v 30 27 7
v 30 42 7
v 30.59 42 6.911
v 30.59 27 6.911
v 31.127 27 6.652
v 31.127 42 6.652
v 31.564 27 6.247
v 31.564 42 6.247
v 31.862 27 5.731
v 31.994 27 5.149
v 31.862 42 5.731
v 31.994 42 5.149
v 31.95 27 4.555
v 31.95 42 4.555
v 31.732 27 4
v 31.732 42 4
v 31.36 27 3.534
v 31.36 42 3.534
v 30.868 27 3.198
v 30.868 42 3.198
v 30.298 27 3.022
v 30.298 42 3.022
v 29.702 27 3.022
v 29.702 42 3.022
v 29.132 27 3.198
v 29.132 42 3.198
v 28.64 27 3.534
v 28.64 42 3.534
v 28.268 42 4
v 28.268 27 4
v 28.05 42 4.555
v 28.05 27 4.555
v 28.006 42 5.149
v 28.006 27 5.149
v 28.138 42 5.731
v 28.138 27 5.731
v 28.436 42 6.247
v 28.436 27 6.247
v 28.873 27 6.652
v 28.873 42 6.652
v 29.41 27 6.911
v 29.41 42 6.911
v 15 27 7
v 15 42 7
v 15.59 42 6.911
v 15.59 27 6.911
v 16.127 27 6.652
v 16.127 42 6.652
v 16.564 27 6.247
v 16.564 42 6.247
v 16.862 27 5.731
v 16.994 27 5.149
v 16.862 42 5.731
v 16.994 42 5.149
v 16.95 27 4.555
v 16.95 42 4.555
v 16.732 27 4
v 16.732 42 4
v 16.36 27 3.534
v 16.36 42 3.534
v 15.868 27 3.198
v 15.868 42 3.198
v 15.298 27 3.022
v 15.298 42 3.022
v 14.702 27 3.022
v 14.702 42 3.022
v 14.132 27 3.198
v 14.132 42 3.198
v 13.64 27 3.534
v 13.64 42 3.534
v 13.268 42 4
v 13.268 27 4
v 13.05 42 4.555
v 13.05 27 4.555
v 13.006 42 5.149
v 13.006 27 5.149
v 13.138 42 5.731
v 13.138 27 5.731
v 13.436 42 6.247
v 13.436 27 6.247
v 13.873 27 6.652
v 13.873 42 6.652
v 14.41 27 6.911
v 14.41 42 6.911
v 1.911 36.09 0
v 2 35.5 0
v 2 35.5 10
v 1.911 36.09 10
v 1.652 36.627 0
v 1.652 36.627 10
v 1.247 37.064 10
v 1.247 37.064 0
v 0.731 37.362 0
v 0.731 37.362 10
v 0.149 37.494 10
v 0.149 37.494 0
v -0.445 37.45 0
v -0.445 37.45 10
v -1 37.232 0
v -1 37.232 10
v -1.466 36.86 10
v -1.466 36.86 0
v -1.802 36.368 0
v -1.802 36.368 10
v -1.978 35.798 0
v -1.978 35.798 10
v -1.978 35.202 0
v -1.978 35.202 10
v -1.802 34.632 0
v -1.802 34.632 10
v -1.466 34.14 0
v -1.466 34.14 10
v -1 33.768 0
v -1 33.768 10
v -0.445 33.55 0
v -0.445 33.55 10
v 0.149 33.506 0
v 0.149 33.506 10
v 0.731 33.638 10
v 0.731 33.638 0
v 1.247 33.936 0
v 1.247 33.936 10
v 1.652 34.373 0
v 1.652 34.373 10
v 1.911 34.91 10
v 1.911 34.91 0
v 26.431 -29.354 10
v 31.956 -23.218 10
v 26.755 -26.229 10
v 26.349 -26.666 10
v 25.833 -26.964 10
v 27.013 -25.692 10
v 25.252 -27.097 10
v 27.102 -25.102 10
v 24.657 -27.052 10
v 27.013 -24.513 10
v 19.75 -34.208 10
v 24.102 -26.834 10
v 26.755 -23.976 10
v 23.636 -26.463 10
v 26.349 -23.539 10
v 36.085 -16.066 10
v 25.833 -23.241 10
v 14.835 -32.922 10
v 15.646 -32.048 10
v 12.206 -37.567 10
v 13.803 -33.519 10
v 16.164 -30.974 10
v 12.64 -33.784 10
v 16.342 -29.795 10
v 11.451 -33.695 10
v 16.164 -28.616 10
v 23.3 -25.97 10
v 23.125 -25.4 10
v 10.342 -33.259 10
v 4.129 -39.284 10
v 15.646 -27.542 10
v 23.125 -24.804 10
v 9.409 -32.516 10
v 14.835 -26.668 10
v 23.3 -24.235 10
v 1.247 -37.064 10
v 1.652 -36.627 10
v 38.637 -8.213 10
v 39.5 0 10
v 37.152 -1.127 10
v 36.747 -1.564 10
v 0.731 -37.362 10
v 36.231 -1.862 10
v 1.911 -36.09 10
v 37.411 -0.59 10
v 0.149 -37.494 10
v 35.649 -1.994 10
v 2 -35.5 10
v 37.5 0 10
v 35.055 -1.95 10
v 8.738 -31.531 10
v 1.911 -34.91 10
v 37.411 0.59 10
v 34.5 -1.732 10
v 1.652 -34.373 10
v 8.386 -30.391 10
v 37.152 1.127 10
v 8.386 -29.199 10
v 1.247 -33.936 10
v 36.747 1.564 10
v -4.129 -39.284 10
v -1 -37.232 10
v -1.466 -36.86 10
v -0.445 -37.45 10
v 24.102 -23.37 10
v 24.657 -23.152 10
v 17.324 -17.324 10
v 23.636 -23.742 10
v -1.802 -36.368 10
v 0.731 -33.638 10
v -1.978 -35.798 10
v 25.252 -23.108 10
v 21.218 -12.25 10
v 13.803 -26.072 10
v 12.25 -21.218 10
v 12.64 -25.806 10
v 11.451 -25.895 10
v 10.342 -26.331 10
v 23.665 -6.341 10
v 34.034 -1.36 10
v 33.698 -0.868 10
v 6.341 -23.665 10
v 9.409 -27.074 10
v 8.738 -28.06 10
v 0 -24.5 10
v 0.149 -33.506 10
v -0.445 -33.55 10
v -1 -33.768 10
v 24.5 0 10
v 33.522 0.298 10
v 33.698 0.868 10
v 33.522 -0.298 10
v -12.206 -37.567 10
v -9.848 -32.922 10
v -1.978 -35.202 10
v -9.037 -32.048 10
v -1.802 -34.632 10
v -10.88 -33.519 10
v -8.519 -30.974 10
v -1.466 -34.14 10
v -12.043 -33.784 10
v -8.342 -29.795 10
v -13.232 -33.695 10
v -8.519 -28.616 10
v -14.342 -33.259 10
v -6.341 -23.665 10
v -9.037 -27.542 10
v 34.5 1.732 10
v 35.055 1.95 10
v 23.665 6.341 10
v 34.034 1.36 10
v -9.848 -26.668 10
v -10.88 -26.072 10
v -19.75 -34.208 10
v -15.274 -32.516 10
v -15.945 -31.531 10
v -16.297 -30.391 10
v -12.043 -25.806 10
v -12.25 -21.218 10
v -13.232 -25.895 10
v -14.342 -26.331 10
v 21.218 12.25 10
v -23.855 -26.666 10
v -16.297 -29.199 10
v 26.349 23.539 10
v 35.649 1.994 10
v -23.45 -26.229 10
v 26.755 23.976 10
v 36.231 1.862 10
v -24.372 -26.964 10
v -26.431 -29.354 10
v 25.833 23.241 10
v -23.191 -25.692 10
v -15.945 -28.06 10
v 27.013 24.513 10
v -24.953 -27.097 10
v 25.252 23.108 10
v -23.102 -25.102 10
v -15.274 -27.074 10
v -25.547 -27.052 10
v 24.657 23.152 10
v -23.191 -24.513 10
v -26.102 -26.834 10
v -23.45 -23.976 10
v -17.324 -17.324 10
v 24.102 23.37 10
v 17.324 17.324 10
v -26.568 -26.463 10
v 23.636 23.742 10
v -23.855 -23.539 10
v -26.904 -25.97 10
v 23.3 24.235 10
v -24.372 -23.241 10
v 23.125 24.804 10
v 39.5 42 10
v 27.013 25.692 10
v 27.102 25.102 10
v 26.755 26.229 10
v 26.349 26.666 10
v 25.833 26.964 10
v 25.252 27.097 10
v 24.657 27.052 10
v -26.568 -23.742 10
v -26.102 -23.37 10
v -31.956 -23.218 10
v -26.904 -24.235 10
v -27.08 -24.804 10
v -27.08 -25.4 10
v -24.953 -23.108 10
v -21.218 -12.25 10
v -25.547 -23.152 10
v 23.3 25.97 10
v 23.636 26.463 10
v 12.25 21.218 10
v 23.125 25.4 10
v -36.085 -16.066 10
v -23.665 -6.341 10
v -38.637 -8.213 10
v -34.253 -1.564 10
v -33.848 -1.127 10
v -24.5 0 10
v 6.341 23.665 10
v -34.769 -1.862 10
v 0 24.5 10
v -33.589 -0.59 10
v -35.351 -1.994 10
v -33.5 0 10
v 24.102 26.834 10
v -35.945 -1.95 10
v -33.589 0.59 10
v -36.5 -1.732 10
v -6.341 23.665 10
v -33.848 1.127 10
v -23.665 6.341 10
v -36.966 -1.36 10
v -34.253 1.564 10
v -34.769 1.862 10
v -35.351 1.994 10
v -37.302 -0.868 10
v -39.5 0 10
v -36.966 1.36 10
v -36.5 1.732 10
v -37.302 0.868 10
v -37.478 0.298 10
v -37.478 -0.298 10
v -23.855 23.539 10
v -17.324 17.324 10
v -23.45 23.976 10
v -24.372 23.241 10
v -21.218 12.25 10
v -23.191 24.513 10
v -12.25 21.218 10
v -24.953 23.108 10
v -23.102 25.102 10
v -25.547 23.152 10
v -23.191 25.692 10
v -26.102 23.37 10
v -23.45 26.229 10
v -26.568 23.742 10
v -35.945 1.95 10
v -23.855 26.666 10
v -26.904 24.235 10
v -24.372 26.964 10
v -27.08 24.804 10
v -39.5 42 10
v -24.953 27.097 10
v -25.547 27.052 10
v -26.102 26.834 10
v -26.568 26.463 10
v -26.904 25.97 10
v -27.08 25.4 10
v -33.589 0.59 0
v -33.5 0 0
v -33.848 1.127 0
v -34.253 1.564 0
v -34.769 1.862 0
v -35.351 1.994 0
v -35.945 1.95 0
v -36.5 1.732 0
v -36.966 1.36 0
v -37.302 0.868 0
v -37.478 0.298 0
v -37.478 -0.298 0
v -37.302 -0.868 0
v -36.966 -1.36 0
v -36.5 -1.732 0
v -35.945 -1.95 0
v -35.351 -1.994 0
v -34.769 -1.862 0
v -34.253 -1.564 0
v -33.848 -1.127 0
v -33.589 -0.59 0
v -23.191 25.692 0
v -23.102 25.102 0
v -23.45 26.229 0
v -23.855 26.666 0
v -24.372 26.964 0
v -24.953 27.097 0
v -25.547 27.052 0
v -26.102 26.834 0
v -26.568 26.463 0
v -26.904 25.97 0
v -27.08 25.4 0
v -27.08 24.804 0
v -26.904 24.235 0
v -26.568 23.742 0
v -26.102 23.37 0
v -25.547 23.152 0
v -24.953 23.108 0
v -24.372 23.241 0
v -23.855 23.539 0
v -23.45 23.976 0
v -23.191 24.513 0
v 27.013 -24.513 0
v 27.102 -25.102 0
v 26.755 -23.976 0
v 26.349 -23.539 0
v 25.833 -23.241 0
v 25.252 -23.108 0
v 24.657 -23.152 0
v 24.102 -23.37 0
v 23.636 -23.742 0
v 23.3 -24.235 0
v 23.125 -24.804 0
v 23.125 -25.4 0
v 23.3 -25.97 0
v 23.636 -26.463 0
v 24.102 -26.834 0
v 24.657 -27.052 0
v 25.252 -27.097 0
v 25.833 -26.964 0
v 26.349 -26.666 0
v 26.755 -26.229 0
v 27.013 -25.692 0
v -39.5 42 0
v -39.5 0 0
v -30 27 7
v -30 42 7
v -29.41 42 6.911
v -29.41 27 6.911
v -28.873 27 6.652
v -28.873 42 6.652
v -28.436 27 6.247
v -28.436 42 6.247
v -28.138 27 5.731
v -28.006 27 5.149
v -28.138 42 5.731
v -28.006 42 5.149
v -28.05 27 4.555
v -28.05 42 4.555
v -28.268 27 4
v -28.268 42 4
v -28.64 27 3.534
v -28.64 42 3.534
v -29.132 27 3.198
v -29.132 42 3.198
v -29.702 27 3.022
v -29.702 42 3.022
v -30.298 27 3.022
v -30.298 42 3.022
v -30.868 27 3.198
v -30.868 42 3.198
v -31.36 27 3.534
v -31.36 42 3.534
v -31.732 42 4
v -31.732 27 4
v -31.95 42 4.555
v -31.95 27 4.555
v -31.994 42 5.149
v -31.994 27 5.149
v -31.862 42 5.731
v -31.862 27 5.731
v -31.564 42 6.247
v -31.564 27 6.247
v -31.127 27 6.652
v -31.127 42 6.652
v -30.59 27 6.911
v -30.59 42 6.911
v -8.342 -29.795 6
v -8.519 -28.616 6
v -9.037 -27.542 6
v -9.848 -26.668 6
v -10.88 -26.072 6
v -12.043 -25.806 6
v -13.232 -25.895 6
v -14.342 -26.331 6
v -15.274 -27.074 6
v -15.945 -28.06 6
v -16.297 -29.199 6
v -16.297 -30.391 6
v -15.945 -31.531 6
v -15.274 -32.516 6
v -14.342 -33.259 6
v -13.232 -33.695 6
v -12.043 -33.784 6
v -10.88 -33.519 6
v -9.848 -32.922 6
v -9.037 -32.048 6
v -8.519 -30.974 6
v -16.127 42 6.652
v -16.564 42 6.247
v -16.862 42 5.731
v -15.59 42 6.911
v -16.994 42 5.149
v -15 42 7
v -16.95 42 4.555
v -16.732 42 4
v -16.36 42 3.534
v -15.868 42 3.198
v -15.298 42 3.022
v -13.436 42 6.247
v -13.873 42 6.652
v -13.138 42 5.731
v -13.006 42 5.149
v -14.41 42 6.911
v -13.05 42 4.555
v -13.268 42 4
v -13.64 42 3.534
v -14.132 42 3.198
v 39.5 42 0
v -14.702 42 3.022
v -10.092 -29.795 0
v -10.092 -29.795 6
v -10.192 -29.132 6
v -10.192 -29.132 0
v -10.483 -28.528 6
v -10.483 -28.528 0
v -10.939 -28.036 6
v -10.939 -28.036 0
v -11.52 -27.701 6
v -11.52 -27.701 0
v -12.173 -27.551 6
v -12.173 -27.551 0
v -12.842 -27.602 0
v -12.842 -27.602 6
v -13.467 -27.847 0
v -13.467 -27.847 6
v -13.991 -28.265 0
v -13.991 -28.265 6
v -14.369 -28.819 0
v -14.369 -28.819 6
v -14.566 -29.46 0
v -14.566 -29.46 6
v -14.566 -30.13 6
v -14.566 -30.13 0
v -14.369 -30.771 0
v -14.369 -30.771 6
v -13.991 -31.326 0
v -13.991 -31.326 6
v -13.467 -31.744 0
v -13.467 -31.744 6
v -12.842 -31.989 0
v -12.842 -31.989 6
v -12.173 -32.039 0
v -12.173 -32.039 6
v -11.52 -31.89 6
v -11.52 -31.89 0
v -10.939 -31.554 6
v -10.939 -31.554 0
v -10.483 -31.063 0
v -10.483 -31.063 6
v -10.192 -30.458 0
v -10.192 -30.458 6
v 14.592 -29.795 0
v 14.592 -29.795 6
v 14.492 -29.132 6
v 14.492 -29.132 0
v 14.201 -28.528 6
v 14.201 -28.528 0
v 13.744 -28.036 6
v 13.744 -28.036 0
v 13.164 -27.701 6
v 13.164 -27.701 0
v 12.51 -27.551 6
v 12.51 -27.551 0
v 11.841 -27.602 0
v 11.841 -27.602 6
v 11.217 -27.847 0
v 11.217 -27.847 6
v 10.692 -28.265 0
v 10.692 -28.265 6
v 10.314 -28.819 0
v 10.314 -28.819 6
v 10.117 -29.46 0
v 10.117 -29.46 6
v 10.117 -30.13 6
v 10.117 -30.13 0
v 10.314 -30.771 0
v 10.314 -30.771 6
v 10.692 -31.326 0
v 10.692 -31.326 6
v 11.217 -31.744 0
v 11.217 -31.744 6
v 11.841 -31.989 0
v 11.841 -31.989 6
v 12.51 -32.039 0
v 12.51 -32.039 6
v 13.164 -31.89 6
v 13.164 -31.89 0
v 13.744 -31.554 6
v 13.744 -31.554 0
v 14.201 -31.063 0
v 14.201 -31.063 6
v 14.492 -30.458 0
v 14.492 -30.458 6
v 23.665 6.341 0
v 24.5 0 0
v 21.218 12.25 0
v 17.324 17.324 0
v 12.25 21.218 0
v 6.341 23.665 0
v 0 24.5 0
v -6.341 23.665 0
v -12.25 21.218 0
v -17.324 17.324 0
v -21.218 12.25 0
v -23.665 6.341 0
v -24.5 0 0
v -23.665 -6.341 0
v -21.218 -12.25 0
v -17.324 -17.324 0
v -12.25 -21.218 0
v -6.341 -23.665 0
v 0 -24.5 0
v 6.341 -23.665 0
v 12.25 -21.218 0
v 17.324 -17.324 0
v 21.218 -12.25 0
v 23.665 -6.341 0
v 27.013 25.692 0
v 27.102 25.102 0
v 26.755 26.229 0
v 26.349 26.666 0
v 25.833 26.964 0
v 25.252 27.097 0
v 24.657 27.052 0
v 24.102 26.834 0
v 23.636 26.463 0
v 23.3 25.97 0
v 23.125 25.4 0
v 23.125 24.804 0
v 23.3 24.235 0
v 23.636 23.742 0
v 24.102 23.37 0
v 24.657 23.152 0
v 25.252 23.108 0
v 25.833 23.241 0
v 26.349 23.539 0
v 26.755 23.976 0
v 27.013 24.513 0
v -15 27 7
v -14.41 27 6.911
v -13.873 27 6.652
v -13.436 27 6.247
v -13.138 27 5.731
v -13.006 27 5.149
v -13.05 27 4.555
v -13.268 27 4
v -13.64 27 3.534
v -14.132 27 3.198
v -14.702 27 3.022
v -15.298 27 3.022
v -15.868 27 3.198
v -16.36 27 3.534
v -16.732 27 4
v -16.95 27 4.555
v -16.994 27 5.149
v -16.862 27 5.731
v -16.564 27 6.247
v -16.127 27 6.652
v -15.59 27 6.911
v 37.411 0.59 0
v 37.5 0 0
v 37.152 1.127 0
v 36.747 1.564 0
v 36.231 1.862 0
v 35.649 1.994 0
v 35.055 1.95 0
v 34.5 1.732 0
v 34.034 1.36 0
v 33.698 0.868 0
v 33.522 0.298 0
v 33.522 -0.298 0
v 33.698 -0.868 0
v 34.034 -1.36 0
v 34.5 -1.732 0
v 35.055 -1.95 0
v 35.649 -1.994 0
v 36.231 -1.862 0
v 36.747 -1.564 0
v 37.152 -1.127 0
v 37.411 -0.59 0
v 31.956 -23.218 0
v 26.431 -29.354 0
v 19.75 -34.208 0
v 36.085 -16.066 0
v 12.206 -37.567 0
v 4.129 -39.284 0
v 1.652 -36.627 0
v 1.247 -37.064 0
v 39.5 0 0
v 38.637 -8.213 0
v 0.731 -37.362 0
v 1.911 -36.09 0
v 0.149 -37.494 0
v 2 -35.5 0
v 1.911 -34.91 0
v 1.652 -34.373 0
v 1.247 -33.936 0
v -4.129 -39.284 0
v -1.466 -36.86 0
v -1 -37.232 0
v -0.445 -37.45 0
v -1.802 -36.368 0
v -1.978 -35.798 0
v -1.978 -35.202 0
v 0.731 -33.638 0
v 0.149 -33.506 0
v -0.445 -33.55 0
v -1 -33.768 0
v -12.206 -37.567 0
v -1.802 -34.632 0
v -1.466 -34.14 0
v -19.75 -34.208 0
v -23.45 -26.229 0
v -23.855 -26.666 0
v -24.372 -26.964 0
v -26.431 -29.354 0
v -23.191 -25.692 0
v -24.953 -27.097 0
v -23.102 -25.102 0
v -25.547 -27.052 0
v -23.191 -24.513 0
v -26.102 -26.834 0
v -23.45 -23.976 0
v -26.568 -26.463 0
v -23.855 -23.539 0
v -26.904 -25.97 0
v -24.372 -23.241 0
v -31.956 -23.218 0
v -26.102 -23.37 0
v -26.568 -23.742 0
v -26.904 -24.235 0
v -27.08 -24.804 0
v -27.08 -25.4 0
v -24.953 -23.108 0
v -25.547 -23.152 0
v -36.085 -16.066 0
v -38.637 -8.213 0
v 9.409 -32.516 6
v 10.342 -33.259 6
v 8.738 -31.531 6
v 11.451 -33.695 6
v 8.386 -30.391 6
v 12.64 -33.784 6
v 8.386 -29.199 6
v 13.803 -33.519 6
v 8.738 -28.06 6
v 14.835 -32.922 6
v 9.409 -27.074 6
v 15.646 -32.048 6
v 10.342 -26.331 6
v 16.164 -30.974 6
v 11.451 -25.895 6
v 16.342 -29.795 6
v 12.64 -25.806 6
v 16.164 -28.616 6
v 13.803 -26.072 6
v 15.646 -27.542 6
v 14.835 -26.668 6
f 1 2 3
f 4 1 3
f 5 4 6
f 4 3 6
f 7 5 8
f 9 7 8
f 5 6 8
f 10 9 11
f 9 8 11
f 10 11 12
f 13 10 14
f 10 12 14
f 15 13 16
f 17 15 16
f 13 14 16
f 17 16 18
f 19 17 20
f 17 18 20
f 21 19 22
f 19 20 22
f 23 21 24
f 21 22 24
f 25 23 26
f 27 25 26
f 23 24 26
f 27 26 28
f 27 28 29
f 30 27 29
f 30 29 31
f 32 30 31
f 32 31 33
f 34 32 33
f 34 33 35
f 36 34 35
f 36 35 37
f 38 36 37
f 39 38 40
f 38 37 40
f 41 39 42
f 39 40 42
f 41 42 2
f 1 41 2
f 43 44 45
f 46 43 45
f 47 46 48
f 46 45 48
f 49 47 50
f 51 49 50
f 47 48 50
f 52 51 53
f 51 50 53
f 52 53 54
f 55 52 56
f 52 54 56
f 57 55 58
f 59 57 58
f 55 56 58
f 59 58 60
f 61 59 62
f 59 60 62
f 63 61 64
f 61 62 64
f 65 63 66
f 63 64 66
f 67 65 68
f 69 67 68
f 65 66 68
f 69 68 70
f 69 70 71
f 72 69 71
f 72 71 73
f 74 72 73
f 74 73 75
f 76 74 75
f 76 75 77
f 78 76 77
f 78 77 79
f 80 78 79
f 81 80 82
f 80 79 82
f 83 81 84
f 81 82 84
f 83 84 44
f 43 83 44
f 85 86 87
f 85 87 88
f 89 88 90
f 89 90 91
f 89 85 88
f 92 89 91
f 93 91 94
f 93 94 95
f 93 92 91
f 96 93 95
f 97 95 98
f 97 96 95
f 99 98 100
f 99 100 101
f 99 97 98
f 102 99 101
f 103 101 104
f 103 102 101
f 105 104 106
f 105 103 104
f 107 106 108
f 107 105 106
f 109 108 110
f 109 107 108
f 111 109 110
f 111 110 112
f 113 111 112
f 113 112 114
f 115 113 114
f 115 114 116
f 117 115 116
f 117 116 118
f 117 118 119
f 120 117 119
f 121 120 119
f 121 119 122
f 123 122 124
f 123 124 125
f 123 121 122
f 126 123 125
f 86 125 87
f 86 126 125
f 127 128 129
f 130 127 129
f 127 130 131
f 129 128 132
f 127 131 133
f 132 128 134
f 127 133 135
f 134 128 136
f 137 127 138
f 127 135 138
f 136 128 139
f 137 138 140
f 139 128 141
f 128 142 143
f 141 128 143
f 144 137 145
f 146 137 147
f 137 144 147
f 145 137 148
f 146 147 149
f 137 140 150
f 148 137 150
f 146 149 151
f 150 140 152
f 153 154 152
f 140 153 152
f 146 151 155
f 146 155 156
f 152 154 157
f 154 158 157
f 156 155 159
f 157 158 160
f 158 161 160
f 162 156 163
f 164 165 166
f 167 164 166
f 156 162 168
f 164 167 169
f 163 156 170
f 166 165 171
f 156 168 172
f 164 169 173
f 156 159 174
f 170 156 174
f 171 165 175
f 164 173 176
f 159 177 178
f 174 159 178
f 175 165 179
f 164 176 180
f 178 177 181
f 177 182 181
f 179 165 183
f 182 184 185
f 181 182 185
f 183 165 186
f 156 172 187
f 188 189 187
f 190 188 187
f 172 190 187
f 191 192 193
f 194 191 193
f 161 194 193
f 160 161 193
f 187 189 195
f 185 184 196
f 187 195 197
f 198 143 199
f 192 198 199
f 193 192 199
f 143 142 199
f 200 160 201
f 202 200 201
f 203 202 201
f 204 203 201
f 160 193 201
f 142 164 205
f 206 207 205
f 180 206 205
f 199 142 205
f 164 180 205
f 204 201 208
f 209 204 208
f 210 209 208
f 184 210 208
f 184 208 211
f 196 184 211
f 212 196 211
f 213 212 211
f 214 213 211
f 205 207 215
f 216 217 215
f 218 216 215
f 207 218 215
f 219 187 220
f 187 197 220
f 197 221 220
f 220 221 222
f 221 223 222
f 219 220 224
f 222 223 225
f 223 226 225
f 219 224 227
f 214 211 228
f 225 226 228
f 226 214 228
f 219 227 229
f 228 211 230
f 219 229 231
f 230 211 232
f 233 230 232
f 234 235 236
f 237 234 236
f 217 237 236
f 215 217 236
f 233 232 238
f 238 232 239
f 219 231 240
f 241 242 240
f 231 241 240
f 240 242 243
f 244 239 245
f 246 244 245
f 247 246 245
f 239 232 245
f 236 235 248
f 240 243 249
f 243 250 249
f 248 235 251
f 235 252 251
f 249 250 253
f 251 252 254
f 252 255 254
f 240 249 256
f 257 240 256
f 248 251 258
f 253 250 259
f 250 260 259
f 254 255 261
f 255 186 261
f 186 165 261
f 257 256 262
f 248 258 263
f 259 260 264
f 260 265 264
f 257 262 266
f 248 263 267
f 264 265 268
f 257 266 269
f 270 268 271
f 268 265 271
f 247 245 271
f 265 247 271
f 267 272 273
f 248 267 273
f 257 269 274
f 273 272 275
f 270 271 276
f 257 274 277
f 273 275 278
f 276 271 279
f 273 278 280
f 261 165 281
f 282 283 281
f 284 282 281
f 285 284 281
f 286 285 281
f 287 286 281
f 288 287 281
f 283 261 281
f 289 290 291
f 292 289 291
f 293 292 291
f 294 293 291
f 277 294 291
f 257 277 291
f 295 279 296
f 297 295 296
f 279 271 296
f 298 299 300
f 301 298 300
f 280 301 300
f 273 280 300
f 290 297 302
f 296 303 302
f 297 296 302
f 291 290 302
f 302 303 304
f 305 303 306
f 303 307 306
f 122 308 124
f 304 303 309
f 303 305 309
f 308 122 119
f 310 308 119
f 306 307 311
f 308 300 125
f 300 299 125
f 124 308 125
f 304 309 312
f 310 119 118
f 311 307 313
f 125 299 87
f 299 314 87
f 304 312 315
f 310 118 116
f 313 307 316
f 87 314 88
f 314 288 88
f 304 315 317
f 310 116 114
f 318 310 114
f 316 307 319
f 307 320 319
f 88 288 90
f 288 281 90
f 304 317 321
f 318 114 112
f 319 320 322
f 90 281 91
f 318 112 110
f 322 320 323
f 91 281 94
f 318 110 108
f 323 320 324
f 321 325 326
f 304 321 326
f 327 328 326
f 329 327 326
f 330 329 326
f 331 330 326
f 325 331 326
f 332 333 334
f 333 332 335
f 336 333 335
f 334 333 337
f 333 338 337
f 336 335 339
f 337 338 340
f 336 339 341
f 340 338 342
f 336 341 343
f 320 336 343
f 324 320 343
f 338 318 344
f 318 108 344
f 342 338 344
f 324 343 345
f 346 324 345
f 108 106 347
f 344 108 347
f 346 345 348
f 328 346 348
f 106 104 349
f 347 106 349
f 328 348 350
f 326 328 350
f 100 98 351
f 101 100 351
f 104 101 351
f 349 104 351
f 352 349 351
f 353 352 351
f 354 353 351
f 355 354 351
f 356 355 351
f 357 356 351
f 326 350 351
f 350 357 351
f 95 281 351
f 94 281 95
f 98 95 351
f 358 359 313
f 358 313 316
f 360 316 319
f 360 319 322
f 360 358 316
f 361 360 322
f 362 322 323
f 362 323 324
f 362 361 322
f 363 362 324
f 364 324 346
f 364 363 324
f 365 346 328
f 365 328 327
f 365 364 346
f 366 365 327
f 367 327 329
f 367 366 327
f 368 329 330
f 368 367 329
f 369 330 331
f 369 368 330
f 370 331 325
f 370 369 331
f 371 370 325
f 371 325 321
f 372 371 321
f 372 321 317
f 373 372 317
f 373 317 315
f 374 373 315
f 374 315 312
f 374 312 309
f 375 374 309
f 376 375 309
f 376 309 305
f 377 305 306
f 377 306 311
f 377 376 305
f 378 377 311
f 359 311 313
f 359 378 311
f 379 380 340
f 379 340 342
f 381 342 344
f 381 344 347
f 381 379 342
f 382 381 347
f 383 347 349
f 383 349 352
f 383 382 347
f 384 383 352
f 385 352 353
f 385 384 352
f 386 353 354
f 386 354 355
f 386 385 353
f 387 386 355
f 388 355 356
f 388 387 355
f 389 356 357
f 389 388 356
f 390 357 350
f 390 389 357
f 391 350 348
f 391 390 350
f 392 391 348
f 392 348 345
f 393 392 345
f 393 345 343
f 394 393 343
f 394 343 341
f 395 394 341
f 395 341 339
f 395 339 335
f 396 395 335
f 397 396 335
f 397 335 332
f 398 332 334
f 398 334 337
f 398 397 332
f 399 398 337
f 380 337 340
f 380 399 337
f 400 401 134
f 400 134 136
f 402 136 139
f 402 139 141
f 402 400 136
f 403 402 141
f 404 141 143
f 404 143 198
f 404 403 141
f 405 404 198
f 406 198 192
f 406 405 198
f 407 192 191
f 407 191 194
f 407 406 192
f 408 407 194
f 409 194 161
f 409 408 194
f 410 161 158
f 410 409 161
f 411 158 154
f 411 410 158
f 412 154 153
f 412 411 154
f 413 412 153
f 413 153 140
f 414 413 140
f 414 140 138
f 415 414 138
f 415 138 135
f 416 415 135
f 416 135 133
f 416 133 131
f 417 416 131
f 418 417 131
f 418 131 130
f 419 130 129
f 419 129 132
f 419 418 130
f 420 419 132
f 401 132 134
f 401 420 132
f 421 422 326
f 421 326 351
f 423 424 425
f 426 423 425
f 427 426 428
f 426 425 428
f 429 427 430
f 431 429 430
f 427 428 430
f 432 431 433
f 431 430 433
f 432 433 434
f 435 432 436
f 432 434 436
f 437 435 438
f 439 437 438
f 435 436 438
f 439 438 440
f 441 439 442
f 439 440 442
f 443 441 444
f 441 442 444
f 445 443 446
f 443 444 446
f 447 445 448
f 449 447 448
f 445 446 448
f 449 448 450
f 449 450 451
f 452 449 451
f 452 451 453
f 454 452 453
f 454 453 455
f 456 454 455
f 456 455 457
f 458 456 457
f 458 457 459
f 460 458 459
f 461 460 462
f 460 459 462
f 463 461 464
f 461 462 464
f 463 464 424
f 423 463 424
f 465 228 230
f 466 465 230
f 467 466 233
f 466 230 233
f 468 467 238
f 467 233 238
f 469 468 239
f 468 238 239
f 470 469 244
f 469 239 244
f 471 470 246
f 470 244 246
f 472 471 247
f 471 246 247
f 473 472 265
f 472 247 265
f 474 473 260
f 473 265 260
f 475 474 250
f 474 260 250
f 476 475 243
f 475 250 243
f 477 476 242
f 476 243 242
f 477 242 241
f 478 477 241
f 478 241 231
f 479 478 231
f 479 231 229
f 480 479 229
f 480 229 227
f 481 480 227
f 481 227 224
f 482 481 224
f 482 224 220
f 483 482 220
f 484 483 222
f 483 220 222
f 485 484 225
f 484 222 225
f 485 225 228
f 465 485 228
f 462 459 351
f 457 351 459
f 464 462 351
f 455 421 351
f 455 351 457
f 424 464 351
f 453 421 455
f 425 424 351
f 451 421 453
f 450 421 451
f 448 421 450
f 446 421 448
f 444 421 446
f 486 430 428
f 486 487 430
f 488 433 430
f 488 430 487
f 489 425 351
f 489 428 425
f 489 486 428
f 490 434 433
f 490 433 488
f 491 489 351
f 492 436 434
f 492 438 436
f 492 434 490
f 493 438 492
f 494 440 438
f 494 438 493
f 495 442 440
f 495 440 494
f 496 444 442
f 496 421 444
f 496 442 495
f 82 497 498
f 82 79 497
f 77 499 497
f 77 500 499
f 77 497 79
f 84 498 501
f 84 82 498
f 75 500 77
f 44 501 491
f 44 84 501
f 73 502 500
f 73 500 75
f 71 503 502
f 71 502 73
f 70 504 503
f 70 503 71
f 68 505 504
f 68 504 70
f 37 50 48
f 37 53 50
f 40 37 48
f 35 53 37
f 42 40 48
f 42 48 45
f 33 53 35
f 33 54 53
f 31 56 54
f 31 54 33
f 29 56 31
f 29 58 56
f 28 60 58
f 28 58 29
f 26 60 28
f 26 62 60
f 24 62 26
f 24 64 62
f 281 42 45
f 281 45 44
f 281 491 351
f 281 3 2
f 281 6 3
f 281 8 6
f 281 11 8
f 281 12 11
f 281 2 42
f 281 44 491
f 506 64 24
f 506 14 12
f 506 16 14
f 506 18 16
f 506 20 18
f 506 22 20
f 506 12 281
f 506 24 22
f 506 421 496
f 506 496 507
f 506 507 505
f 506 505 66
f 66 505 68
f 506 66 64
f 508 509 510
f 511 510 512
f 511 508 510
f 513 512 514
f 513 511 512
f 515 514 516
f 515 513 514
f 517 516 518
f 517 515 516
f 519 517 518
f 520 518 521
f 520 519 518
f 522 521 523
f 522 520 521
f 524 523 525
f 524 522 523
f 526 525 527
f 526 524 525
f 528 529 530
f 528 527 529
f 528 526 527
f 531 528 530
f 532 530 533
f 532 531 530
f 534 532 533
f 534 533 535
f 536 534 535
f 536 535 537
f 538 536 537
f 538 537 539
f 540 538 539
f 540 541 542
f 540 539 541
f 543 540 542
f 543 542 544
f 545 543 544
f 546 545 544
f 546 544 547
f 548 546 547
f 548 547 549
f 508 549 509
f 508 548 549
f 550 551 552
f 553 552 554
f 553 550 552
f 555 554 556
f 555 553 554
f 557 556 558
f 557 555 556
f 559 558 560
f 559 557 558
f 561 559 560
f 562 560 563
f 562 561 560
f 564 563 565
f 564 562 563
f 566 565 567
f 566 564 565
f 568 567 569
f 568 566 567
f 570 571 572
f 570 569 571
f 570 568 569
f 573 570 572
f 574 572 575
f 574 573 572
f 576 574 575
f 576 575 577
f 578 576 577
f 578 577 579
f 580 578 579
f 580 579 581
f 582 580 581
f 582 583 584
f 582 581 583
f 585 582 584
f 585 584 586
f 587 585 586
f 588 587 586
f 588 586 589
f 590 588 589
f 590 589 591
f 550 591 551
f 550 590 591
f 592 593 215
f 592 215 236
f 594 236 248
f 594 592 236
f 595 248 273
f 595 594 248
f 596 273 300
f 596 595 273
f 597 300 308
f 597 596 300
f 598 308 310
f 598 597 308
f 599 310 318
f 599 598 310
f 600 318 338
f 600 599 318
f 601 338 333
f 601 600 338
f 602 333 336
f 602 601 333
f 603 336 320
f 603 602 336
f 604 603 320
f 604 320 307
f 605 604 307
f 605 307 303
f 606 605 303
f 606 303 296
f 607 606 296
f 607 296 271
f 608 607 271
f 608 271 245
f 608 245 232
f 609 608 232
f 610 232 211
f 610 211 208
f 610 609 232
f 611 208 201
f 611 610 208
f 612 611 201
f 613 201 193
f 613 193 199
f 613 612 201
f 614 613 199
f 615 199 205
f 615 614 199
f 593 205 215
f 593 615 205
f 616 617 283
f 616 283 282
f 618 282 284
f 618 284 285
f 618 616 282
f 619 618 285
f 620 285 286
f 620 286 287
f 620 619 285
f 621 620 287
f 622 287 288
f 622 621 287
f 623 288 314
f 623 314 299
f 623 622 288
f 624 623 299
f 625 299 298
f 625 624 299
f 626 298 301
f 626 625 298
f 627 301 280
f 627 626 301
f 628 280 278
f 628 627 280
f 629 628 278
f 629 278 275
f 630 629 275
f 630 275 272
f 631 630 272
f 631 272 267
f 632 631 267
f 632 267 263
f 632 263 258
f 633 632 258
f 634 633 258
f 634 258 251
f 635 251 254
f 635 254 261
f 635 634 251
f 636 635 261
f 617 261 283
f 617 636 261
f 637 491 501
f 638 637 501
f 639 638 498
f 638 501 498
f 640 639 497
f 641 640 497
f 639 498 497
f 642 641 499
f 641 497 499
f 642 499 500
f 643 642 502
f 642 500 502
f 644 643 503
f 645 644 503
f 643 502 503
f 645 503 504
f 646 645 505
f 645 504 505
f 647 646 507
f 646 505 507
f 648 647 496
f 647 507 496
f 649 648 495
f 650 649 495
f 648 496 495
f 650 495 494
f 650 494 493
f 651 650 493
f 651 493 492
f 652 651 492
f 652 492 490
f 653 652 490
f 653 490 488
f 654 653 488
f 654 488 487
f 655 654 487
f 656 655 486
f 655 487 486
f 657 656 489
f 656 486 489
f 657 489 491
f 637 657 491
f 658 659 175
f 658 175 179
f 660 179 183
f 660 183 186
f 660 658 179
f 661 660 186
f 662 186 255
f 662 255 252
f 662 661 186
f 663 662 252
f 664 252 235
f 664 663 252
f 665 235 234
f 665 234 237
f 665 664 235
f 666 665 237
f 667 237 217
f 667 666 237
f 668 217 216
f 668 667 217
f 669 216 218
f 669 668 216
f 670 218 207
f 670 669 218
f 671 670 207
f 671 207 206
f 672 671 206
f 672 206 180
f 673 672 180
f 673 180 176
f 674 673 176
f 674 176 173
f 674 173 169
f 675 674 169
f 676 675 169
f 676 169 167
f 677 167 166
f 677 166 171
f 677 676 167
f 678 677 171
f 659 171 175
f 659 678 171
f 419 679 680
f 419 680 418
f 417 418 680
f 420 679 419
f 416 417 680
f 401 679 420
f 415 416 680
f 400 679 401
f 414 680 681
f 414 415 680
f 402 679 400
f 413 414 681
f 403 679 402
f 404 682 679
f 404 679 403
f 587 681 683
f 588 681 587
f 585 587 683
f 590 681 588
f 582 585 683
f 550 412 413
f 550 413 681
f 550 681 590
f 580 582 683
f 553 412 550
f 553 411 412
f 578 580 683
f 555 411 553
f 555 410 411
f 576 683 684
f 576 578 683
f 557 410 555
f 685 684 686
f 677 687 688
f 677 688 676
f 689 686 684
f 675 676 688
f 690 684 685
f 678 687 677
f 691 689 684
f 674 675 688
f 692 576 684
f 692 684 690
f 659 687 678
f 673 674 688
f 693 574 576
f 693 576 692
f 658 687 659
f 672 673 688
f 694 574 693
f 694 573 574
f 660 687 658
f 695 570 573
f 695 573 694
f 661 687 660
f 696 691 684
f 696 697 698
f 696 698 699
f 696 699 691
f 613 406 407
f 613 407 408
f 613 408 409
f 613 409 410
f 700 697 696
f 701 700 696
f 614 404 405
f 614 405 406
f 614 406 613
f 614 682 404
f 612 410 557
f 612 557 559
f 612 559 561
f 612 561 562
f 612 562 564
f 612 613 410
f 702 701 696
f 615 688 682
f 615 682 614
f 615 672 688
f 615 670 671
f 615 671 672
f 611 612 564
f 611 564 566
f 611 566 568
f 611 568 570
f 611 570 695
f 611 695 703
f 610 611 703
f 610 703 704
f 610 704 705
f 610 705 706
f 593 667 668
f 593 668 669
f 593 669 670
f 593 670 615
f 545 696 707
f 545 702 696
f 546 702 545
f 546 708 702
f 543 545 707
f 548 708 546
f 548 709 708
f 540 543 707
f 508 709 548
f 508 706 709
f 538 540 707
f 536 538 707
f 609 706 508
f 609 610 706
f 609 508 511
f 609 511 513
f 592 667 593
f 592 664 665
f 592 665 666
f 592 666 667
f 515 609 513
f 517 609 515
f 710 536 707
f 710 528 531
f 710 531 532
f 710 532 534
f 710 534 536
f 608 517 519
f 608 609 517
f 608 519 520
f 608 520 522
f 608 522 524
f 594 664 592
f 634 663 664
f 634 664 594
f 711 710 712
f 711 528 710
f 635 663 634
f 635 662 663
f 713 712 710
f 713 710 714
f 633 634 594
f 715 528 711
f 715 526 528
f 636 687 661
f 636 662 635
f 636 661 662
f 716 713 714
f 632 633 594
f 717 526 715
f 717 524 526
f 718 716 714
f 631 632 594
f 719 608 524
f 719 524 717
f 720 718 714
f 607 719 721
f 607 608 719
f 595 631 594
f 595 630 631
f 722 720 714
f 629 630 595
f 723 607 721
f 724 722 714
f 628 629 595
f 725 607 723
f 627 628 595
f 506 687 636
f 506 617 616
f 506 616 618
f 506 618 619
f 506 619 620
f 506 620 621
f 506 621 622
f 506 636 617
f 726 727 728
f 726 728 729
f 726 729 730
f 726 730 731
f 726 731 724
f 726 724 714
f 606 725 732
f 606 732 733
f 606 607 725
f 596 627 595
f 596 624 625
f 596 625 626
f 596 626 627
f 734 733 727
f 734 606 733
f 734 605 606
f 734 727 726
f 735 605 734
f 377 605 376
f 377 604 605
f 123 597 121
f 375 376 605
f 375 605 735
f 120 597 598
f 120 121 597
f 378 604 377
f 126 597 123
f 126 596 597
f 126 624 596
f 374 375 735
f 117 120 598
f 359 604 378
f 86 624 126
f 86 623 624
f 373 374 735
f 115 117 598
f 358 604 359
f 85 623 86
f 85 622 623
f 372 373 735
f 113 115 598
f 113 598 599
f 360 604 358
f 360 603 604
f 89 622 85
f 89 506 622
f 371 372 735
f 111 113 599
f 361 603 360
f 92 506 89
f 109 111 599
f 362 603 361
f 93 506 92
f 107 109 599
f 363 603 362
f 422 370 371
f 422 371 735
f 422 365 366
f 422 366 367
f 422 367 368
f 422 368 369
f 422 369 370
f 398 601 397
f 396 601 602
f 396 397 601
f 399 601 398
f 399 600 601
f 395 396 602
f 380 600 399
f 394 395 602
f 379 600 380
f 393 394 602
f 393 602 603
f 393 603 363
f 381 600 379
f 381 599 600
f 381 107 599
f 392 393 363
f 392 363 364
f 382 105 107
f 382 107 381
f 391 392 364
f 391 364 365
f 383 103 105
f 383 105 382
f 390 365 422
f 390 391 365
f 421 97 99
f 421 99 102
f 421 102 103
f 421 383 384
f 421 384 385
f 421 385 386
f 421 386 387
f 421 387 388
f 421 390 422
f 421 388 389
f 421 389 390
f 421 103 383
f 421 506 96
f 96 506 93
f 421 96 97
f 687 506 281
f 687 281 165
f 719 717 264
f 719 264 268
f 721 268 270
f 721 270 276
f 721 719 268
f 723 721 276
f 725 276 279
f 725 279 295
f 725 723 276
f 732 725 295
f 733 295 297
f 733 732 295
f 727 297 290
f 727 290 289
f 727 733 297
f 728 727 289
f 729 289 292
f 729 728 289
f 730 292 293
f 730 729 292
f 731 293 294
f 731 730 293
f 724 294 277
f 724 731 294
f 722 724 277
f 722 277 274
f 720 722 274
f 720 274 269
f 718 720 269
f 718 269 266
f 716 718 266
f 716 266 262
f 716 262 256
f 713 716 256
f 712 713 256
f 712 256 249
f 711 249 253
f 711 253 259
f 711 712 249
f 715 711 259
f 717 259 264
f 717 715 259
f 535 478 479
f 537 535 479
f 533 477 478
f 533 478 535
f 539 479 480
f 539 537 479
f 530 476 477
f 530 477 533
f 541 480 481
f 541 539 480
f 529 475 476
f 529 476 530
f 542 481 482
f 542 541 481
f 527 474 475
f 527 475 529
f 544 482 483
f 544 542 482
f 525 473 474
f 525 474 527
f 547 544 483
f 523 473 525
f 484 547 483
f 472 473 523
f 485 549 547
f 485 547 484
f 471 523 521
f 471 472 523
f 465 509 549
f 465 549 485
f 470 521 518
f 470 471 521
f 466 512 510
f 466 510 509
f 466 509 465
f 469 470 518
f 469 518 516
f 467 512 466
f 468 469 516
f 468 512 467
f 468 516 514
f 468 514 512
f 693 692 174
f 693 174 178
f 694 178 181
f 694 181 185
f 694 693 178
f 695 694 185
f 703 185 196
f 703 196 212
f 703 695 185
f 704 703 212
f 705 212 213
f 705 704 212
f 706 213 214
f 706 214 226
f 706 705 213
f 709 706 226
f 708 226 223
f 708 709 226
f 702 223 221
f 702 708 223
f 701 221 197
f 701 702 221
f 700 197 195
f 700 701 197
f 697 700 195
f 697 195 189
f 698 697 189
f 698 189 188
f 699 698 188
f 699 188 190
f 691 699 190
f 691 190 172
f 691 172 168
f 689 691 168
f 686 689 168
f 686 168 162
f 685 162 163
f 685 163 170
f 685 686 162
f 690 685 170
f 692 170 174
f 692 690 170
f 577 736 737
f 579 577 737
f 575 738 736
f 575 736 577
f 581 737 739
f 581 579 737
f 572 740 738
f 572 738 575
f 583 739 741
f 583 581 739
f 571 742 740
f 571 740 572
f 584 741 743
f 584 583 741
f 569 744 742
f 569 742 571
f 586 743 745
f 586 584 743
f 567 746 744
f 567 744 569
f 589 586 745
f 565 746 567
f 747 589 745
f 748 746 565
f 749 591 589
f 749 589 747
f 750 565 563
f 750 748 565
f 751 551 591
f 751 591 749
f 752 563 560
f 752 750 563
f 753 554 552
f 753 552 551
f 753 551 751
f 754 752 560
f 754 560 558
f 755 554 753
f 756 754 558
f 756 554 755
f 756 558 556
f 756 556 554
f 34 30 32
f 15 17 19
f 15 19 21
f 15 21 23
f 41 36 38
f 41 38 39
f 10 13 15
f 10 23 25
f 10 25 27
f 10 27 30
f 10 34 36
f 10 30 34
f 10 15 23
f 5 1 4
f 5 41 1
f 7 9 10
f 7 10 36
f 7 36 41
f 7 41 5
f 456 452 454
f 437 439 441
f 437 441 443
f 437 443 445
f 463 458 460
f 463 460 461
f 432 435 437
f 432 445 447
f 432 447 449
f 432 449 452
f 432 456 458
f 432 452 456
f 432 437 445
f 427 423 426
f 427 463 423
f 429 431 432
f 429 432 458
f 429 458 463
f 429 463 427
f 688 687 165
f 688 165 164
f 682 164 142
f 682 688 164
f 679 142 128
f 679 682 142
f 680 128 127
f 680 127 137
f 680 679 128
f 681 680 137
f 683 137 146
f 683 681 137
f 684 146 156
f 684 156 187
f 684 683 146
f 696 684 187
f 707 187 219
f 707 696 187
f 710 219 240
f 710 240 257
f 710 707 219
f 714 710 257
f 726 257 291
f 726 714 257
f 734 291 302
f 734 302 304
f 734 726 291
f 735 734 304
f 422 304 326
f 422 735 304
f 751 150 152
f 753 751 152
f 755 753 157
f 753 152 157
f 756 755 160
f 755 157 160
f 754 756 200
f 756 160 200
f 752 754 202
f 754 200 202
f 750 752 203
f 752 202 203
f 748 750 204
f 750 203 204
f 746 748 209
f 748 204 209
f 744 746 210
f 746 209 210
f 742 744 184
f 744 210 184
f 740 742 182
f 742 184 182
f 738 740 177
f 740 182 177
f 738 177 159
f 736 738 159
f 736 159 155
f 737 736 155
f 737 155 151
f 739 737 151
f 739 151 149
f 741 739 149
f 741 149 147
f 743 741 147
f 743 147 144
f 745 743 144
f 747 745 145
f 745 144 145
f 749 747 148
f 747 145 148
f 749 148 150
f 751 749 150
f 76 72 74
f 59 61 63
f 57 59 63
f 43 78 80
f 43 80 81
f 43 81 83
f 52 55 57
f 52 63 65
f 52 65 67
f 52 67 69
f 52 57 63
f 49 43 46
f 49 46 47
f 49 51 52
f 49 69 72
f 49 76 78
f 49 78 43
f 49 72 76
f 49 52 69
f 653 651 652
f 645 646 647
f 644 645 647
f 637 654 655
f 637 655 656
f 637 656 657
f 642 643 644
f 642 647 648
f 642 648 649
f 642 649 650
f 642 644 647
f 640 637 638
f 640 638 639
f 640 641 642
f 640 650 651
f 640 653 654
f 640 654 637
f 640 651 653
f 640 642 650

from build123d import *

# Parameters (mm, degrees)
SKETCH_1_R          = 2
SKETCH_1_R_2        = 24.5
SKETCH_1_R_3        = 2.25
EXTRUDE_1_DEPTH     = 10
SKETCH_2_R          = 2
CUT_EXTRUDE_1_DEPTH = 15
SKETCH_4_R          = 4
CUT_EXTRUDE_3_DEPTH = 4


with BuildPart() as part:
    # 스케치1 → 보스-돌출1 (new body)
    with BuildSketch(Plane.XY):
        with BuildLine():
            Line((-39.5, 0), (-39.5, 42))
            Line((-39.5, 42), (39.5, 42))
            Line((39.5, 42), (39.5, 0))
            ThreePointArc((39.5, 0), (0, -39.5), (-39.5, 0))
        make_face()
        with Locations((0, -35.5)):
            Circle(SKETCH_1_R, mode=Mode.SUBTRACT)
        with Locations((-25.102290732, -25.102290732)):
            Circle(SKETCH_1_R, mode=Mode.SUBTRACT)
        with Locations((-35.5, 0)):
            Circle(SKETCH_1_R, mode=Mode.SUBTRACT)
        with Locations((-25.102290732, 25.102290732)):
            Circle(SKETCH_1_R, mode=Mode.SUBTRACT)
        with Locations((0, 35.5)):
            Circle(SKETCH_1_R, mode=Mode.SUBTRACT)
        with Locations((25.102290732, 25.102290732)):
            Circle(SKETCH_1_R, mode=Mode.SUBTRACT)
        with Locations((35.5, 0)):
            Circle(SKETCH_1_R, mode=Mode.SUBTRACT)
        with Locations((25.102290732, -25.102290732)):
            Circle(SKETCH_1_R, mode=Mode.SUBTRACT)
        Circle(SKETCH_1_R_2, mode=Mode.SUBTRACT)
        with Locations((-12.341540694, -29.795114923)):
            Circle(SKETCH_1_R_3, mode=Mode.SUBTRACT)
        with Locations((12.341540694, -29.795114923)):
            Circle(SKETCH_1_R_3, mode=Mode.SUBTRACT)
    extrude(amount=EXTRUDE_1_DEPTH)

    # 스케치2 → 컷-돌출1 (cut)
    with BuildSketch(Plane(origin=(0, 42, 0), x_dir=(1, 0, 0), z_dir=(0, 1, 0))):
        with Locations(Location((-30, -5, 0), (0, 0, 270))):
            Circle(SKETCH_2_R)
        with Locations(Location((-15, -5, 0), (0, 0, 270))):
            Circle(SKETCH_2_R)
        with Locations(Location((15, -5, 0), (0, 0, 270))):
            Circle(SKETCH_2_R)
        with Locations(Location((30, -5, 0), (0, 0, 270))):
            Circle(SKETCH_2_R)
    extrude(amount=-CUT_EXTRUDE_1_DEPTH, mode=Mode.SUBTRACT)

    # 스케치4 → 컷-돌출3 (cut)
    with BuildSketch(Plane.XY.offset(10)):
        with Locations((-12.341540694, -29.795114923)):
            Circle(SKETCH_4_R)
        with Locations((12.341540694, -29.795114923)):
            Circle(SKETCH_4_R)
    extrude(amount=-CUT_EXTRUDE_3_DEPTH, mode=Mode.SUBTRACT)


solid = part.part
